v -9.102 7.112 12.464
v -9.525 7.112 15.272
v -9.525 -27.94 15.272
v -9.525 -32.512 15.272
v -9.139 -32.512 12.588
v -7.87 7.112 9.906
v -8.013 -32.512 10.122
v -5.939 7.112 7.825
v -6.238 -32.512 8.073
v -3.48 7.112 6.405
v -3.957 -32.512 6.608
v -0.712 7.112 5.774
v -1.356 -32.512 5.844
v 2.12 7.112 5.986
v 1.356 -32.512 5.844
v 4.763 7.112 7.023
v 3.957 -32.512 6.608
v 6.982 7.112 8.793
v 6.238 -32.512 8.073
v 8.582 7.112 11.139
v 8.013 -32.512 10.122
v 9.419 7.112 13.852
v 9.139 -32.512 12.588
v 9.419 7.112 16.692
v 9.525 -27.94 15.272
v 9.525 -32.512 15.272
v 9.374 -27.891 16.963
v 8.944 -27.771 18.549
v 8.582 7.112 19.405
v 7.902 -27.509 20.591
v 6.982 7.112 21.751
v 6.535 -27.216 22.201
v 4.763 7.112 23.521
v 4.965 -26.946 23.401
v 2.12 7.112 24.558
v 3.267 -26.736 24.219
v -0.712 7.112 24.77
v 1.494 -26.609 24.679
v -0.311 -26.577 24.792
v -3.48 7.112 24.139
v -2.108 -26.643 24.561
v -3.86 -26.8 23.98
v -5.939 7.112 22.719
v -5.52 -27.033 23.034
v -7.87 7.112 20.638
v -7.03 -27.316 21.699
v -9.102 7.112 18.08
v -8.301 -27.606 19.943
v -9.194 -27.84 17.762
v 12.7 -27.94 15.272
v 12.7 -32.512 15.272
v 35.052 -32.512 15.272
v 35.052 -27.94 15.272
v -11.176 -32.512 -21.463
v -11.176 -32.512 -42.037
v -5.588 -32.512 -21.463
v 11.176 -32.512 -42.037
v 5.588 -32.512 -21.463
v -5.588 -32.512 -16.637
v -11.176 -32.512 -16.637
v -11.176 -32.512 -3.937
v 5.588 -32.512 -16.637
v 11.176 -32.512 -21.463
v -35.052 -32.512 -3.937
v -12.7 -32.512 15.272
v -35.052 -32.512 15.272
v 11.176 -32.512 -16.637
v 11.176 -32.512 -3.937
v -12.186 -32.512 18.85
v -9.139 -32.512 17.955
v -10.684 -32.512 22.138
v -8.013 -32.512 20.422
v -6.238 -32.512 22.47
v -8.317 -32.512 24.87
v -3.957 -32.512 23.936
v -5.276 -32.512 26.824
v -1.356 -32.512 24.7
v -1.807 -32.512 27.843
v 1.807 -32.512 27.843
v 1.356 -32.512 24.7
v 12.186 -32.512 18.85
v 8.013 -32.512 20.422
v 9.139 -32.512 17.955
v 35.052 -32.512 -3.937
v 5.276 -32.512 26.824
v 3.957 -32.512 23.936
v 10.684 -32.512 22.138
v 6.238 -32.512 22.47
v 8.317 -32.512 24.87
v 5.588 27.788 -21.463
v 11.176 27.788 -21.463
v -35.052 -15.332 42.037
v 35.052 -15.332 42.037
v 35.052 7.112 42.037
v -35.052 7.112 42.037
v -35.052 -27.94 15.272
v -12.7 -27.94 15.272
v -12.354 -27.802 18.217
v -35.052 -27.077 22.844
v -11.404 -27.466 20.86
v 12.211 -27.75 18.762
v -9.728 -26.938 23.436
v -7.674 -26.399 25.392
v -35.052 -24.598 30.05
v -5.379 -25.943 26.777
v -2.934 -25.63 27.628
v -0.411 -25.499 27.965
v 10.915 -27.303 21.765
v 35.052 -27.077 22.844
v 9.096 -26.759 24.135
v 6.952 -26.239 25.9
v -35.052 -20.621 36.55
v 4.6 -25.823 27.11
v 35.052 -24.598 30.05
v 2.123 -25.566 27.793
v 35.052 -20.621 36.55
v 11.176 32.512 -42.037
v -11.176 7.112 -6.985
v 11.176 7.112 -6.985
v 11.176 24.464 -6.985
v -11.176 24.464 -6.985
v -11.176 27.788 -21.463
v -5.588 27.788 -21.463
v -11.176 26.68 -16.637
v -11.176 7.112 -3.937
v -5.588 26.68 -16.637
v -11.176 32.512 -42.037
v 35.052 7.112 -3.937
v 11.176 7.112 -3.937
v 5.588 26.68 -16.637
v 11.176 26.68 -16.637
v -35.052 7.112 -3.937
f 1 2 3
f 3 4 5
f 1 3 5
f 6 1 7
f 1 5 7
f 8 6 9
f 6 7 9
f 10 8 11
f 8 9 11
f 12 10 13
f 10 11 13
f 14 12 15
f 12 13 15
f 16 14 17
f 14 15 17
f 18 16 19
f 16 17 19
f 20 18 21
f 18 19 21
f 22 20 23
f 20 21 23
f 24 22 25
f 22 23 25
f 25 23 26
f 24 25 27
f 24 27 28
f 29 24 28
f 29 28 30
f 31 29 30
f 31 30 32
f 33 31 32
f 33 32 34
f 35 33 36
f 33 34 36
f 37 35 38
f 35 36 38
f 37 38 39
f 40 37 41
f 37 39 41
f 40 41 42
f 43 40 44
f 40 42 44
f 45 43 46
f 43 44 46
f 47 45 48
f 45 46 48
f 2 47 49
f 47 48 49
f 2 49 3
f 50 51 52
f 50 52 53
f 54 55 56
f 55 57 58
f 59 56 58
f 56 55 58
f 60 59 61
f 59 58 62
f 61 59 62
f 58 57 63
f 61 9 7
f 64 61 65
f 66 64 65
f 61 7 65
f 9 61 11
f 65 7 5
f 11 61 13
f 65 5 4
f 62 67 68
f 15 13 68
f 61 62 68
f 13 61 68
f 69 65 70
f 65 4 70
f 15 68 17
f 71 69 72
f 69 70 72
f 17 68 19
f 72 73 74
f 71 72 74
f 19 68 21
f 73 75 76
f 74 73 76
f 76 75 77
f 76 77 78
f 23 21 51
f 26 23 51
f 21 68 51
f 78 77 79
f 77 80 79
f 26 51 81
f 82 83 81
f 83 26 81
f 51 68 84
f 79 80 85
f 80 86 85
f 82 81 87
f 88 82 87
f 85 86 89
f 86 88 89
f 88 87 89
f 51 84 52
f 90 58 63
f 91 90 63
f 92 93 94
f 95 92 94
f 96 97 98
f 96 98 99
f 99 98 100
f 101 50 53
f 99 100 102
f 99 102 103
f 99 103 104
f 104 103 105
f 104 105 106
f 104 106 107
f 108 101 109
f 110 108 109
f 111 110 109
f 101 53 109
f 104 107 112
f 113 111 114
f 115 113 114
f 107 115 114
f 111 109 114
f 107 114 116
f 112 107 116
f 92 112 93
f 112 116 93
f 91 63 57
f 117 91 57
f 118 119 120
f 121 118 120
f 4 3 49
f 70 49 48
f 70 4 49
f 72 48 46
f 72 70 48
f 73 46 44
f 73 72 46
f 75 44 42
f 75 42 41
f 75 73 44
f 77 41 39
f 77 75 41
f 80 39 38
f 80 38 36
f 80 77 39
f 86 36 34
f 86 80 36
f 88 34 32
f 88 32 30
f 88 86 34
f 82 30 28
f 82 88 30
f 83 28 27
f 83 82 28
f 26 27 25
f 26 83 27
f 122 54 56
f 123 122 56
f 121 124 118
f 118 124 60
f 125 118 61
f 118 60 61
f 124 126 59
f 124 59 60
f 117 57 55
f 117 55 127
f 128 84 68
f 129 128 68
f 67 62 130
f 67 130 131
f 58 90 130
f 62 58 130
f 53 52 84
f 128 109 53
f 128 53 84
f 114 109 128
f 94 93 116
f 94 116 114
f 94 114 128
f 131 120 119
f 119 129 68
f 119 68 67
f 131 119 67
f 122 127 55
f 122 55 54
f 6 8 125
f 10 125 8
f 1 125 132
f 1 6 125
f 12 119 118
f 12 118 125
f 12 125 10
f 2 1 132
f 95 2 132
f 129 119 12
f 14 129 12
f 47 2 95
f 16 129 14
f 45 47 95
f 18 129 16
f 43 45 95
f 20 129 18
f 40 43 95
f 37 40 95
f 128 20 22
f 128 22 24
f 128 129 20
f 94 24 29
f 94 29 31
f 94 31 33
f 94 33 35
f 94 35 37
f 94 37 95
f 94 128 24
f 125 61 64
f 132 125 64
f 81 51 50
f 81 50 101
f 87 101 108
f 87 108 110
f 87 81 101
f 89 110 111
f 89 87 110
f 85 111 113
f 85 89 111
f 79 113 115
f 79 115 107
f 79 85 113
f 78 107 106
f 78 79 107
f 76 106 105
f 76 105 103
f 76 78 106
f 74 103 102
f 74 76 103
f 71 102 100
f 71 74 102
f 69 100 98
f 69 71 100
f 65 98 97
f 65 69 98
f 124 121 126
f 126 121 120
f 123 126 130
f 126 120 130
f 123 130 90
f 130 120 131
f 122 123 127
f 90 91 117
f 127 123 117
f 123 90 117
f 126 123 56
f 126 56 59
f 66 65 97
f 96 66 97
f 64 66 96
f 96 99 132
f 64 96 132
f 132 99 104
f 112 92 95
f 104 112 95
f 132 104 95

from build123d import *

# Parameters (mm, degrees)
F0_W          = 65.024
F0_H          = 84.074
F1_DEPTH      = 35.052
F1_DEPTH_BACK = 35.052
F2_W          = 5.588
F2_H          = 4.826
F3_DEPTH      = 65.025
F4_W          = 56.330337
F4_H          = 68.819438
F5_DEPTH      = 101.6
F7_DEPTH      = 46.229
F9_DEPTH      = 254
F11_DEPTH     = 25.4
F12_DEPTH     = 65.025


with BuildPart() as f1:
    # F0 (on Right) → F1 (new body, two sides)
    with BuildSketch(Plane.YZ) as f1_sk:
        Rectangle(F0_W, F0_H)
    extrude(amount=F1_DEPTH)
    extrude(f1_sk.sketch, amount=-F1_DEPTH_BACK)

    # F2 (on face) → F3 (cut, through all)
    with BuildSketch(Plane.XZ.offset(32.512)):
        Polygon((-11.176, -16.637), (-11.176, -3.937), (-74.27659, -3.937), (-74.27659, -51.014846), (-11.176, -51.014846), (-11.176, -21.463), (-5.588, -21.463), (-5.588, -16.637), align=None)
        Polygon((76.810068, -3.937), (11.176, -3.937), (11.176, -16.637), (11.176, -21.463), (11.176, -65.525395), (76.810068, -65.525395), align=None)
        with Locations((8.382, -19.05)):
            Rectangle(F2_W, F2_H)
    extrude(amount=-F3_DEPTH, mode=Mode.SUBTRACT)

    # F4 (on face) → F5 (cut, symmetric)
    with BuildSketch(Plane.YZ.offset(35.052)):
        with Locations((35.277168, 27.424719)):
            Rectangle(F4_W, F4_H)
    extrude(amount=F5_DEPTH, both=True, mode=Mode.SUBTRACT)

    # F6 (on face) → F7 (cut, through all)
    with BuildSketch(Plane.YZ.offset(11.176)):
        Polygon((22.86, 0), (32.512, -42.037), (45.35326, -62.610321), (51.058073, 0), align=None)
    extrude(amount=-F7_DEPTH, mode=Mode.SUBTRACT)

    # F8 (on Right) → F9 (cut, symmetric)
    with BuildSketch(Plane.YZ):
        with BuildLine():
            ThreePointArc((-27.93964, 15.271957), (-17.603329, 39.968487), (7.151257, 50.164978))
            Line((7.151257, 50.164978), (-49.631871, 54.338343))
            Line((-49.631871, 54.338343), (-51.628556, 15.271957))
            Line((-51.628556, 15.271957), (-27.93964, 15.271957))
        make_face()
    extrude(amount=F9_DEPTH, both=True, mode=Mode.SUBTRACT)

    # F10 (on face) → F11 (join)
    with BuildSketch(Plane.XZ.offset(32.512)):
        with BuildLine():
            Line((9.525, 15.271957), (12.7, 15.271957))
            ThreePointArc((12.7, 15.271957), (0, 27.971957), (-12.7, 15.271957))
            Line((-12.7, 15.271957), (-9.525, 15.271957))
            ThreePointArc((-9.525, 15.271957), (0, 24.796957), (9.525, 15.271957))
        make_face()
        with BuildLine():
            ThreePointArc((-12.7, 15.271957), (0, 2.571957), (12.7, 15.271957))
            Line((12.7, 15.271957), (9.525, 15.271957))
            ThreePointArc((9.525, 15.271957), (0, 5.746957), (-9.525, 15.271957))
            Line((-9.525, 15.271957), (-12.7, 15.271957))
        make_face()
    extrude(amount=-F11_DEPTH)

    # F10 (on face) → F12 (cut, through all)
    with BuildSketch(Plane.XZ.offset(32.512)):
        with BuildLine():
            Line((-9.525, 15.271957), (9.525, 15.271957))
            ThreePointArc((9.525, 15.271957), (0, 24.796957), (-9.525, 15.271957))
        make_face()
        with BuildLine():
            ThreePointArc((-9.525, 15.271957), (0, 5.746957), (9.525, 15.271957))
            Line((9.525, 15.271957), (-9.525, 15.271957))
        make_face()
    extrude(amount=-F12_DEPTH, mode=Mode.SUBTRACT)


solid = f1.part
